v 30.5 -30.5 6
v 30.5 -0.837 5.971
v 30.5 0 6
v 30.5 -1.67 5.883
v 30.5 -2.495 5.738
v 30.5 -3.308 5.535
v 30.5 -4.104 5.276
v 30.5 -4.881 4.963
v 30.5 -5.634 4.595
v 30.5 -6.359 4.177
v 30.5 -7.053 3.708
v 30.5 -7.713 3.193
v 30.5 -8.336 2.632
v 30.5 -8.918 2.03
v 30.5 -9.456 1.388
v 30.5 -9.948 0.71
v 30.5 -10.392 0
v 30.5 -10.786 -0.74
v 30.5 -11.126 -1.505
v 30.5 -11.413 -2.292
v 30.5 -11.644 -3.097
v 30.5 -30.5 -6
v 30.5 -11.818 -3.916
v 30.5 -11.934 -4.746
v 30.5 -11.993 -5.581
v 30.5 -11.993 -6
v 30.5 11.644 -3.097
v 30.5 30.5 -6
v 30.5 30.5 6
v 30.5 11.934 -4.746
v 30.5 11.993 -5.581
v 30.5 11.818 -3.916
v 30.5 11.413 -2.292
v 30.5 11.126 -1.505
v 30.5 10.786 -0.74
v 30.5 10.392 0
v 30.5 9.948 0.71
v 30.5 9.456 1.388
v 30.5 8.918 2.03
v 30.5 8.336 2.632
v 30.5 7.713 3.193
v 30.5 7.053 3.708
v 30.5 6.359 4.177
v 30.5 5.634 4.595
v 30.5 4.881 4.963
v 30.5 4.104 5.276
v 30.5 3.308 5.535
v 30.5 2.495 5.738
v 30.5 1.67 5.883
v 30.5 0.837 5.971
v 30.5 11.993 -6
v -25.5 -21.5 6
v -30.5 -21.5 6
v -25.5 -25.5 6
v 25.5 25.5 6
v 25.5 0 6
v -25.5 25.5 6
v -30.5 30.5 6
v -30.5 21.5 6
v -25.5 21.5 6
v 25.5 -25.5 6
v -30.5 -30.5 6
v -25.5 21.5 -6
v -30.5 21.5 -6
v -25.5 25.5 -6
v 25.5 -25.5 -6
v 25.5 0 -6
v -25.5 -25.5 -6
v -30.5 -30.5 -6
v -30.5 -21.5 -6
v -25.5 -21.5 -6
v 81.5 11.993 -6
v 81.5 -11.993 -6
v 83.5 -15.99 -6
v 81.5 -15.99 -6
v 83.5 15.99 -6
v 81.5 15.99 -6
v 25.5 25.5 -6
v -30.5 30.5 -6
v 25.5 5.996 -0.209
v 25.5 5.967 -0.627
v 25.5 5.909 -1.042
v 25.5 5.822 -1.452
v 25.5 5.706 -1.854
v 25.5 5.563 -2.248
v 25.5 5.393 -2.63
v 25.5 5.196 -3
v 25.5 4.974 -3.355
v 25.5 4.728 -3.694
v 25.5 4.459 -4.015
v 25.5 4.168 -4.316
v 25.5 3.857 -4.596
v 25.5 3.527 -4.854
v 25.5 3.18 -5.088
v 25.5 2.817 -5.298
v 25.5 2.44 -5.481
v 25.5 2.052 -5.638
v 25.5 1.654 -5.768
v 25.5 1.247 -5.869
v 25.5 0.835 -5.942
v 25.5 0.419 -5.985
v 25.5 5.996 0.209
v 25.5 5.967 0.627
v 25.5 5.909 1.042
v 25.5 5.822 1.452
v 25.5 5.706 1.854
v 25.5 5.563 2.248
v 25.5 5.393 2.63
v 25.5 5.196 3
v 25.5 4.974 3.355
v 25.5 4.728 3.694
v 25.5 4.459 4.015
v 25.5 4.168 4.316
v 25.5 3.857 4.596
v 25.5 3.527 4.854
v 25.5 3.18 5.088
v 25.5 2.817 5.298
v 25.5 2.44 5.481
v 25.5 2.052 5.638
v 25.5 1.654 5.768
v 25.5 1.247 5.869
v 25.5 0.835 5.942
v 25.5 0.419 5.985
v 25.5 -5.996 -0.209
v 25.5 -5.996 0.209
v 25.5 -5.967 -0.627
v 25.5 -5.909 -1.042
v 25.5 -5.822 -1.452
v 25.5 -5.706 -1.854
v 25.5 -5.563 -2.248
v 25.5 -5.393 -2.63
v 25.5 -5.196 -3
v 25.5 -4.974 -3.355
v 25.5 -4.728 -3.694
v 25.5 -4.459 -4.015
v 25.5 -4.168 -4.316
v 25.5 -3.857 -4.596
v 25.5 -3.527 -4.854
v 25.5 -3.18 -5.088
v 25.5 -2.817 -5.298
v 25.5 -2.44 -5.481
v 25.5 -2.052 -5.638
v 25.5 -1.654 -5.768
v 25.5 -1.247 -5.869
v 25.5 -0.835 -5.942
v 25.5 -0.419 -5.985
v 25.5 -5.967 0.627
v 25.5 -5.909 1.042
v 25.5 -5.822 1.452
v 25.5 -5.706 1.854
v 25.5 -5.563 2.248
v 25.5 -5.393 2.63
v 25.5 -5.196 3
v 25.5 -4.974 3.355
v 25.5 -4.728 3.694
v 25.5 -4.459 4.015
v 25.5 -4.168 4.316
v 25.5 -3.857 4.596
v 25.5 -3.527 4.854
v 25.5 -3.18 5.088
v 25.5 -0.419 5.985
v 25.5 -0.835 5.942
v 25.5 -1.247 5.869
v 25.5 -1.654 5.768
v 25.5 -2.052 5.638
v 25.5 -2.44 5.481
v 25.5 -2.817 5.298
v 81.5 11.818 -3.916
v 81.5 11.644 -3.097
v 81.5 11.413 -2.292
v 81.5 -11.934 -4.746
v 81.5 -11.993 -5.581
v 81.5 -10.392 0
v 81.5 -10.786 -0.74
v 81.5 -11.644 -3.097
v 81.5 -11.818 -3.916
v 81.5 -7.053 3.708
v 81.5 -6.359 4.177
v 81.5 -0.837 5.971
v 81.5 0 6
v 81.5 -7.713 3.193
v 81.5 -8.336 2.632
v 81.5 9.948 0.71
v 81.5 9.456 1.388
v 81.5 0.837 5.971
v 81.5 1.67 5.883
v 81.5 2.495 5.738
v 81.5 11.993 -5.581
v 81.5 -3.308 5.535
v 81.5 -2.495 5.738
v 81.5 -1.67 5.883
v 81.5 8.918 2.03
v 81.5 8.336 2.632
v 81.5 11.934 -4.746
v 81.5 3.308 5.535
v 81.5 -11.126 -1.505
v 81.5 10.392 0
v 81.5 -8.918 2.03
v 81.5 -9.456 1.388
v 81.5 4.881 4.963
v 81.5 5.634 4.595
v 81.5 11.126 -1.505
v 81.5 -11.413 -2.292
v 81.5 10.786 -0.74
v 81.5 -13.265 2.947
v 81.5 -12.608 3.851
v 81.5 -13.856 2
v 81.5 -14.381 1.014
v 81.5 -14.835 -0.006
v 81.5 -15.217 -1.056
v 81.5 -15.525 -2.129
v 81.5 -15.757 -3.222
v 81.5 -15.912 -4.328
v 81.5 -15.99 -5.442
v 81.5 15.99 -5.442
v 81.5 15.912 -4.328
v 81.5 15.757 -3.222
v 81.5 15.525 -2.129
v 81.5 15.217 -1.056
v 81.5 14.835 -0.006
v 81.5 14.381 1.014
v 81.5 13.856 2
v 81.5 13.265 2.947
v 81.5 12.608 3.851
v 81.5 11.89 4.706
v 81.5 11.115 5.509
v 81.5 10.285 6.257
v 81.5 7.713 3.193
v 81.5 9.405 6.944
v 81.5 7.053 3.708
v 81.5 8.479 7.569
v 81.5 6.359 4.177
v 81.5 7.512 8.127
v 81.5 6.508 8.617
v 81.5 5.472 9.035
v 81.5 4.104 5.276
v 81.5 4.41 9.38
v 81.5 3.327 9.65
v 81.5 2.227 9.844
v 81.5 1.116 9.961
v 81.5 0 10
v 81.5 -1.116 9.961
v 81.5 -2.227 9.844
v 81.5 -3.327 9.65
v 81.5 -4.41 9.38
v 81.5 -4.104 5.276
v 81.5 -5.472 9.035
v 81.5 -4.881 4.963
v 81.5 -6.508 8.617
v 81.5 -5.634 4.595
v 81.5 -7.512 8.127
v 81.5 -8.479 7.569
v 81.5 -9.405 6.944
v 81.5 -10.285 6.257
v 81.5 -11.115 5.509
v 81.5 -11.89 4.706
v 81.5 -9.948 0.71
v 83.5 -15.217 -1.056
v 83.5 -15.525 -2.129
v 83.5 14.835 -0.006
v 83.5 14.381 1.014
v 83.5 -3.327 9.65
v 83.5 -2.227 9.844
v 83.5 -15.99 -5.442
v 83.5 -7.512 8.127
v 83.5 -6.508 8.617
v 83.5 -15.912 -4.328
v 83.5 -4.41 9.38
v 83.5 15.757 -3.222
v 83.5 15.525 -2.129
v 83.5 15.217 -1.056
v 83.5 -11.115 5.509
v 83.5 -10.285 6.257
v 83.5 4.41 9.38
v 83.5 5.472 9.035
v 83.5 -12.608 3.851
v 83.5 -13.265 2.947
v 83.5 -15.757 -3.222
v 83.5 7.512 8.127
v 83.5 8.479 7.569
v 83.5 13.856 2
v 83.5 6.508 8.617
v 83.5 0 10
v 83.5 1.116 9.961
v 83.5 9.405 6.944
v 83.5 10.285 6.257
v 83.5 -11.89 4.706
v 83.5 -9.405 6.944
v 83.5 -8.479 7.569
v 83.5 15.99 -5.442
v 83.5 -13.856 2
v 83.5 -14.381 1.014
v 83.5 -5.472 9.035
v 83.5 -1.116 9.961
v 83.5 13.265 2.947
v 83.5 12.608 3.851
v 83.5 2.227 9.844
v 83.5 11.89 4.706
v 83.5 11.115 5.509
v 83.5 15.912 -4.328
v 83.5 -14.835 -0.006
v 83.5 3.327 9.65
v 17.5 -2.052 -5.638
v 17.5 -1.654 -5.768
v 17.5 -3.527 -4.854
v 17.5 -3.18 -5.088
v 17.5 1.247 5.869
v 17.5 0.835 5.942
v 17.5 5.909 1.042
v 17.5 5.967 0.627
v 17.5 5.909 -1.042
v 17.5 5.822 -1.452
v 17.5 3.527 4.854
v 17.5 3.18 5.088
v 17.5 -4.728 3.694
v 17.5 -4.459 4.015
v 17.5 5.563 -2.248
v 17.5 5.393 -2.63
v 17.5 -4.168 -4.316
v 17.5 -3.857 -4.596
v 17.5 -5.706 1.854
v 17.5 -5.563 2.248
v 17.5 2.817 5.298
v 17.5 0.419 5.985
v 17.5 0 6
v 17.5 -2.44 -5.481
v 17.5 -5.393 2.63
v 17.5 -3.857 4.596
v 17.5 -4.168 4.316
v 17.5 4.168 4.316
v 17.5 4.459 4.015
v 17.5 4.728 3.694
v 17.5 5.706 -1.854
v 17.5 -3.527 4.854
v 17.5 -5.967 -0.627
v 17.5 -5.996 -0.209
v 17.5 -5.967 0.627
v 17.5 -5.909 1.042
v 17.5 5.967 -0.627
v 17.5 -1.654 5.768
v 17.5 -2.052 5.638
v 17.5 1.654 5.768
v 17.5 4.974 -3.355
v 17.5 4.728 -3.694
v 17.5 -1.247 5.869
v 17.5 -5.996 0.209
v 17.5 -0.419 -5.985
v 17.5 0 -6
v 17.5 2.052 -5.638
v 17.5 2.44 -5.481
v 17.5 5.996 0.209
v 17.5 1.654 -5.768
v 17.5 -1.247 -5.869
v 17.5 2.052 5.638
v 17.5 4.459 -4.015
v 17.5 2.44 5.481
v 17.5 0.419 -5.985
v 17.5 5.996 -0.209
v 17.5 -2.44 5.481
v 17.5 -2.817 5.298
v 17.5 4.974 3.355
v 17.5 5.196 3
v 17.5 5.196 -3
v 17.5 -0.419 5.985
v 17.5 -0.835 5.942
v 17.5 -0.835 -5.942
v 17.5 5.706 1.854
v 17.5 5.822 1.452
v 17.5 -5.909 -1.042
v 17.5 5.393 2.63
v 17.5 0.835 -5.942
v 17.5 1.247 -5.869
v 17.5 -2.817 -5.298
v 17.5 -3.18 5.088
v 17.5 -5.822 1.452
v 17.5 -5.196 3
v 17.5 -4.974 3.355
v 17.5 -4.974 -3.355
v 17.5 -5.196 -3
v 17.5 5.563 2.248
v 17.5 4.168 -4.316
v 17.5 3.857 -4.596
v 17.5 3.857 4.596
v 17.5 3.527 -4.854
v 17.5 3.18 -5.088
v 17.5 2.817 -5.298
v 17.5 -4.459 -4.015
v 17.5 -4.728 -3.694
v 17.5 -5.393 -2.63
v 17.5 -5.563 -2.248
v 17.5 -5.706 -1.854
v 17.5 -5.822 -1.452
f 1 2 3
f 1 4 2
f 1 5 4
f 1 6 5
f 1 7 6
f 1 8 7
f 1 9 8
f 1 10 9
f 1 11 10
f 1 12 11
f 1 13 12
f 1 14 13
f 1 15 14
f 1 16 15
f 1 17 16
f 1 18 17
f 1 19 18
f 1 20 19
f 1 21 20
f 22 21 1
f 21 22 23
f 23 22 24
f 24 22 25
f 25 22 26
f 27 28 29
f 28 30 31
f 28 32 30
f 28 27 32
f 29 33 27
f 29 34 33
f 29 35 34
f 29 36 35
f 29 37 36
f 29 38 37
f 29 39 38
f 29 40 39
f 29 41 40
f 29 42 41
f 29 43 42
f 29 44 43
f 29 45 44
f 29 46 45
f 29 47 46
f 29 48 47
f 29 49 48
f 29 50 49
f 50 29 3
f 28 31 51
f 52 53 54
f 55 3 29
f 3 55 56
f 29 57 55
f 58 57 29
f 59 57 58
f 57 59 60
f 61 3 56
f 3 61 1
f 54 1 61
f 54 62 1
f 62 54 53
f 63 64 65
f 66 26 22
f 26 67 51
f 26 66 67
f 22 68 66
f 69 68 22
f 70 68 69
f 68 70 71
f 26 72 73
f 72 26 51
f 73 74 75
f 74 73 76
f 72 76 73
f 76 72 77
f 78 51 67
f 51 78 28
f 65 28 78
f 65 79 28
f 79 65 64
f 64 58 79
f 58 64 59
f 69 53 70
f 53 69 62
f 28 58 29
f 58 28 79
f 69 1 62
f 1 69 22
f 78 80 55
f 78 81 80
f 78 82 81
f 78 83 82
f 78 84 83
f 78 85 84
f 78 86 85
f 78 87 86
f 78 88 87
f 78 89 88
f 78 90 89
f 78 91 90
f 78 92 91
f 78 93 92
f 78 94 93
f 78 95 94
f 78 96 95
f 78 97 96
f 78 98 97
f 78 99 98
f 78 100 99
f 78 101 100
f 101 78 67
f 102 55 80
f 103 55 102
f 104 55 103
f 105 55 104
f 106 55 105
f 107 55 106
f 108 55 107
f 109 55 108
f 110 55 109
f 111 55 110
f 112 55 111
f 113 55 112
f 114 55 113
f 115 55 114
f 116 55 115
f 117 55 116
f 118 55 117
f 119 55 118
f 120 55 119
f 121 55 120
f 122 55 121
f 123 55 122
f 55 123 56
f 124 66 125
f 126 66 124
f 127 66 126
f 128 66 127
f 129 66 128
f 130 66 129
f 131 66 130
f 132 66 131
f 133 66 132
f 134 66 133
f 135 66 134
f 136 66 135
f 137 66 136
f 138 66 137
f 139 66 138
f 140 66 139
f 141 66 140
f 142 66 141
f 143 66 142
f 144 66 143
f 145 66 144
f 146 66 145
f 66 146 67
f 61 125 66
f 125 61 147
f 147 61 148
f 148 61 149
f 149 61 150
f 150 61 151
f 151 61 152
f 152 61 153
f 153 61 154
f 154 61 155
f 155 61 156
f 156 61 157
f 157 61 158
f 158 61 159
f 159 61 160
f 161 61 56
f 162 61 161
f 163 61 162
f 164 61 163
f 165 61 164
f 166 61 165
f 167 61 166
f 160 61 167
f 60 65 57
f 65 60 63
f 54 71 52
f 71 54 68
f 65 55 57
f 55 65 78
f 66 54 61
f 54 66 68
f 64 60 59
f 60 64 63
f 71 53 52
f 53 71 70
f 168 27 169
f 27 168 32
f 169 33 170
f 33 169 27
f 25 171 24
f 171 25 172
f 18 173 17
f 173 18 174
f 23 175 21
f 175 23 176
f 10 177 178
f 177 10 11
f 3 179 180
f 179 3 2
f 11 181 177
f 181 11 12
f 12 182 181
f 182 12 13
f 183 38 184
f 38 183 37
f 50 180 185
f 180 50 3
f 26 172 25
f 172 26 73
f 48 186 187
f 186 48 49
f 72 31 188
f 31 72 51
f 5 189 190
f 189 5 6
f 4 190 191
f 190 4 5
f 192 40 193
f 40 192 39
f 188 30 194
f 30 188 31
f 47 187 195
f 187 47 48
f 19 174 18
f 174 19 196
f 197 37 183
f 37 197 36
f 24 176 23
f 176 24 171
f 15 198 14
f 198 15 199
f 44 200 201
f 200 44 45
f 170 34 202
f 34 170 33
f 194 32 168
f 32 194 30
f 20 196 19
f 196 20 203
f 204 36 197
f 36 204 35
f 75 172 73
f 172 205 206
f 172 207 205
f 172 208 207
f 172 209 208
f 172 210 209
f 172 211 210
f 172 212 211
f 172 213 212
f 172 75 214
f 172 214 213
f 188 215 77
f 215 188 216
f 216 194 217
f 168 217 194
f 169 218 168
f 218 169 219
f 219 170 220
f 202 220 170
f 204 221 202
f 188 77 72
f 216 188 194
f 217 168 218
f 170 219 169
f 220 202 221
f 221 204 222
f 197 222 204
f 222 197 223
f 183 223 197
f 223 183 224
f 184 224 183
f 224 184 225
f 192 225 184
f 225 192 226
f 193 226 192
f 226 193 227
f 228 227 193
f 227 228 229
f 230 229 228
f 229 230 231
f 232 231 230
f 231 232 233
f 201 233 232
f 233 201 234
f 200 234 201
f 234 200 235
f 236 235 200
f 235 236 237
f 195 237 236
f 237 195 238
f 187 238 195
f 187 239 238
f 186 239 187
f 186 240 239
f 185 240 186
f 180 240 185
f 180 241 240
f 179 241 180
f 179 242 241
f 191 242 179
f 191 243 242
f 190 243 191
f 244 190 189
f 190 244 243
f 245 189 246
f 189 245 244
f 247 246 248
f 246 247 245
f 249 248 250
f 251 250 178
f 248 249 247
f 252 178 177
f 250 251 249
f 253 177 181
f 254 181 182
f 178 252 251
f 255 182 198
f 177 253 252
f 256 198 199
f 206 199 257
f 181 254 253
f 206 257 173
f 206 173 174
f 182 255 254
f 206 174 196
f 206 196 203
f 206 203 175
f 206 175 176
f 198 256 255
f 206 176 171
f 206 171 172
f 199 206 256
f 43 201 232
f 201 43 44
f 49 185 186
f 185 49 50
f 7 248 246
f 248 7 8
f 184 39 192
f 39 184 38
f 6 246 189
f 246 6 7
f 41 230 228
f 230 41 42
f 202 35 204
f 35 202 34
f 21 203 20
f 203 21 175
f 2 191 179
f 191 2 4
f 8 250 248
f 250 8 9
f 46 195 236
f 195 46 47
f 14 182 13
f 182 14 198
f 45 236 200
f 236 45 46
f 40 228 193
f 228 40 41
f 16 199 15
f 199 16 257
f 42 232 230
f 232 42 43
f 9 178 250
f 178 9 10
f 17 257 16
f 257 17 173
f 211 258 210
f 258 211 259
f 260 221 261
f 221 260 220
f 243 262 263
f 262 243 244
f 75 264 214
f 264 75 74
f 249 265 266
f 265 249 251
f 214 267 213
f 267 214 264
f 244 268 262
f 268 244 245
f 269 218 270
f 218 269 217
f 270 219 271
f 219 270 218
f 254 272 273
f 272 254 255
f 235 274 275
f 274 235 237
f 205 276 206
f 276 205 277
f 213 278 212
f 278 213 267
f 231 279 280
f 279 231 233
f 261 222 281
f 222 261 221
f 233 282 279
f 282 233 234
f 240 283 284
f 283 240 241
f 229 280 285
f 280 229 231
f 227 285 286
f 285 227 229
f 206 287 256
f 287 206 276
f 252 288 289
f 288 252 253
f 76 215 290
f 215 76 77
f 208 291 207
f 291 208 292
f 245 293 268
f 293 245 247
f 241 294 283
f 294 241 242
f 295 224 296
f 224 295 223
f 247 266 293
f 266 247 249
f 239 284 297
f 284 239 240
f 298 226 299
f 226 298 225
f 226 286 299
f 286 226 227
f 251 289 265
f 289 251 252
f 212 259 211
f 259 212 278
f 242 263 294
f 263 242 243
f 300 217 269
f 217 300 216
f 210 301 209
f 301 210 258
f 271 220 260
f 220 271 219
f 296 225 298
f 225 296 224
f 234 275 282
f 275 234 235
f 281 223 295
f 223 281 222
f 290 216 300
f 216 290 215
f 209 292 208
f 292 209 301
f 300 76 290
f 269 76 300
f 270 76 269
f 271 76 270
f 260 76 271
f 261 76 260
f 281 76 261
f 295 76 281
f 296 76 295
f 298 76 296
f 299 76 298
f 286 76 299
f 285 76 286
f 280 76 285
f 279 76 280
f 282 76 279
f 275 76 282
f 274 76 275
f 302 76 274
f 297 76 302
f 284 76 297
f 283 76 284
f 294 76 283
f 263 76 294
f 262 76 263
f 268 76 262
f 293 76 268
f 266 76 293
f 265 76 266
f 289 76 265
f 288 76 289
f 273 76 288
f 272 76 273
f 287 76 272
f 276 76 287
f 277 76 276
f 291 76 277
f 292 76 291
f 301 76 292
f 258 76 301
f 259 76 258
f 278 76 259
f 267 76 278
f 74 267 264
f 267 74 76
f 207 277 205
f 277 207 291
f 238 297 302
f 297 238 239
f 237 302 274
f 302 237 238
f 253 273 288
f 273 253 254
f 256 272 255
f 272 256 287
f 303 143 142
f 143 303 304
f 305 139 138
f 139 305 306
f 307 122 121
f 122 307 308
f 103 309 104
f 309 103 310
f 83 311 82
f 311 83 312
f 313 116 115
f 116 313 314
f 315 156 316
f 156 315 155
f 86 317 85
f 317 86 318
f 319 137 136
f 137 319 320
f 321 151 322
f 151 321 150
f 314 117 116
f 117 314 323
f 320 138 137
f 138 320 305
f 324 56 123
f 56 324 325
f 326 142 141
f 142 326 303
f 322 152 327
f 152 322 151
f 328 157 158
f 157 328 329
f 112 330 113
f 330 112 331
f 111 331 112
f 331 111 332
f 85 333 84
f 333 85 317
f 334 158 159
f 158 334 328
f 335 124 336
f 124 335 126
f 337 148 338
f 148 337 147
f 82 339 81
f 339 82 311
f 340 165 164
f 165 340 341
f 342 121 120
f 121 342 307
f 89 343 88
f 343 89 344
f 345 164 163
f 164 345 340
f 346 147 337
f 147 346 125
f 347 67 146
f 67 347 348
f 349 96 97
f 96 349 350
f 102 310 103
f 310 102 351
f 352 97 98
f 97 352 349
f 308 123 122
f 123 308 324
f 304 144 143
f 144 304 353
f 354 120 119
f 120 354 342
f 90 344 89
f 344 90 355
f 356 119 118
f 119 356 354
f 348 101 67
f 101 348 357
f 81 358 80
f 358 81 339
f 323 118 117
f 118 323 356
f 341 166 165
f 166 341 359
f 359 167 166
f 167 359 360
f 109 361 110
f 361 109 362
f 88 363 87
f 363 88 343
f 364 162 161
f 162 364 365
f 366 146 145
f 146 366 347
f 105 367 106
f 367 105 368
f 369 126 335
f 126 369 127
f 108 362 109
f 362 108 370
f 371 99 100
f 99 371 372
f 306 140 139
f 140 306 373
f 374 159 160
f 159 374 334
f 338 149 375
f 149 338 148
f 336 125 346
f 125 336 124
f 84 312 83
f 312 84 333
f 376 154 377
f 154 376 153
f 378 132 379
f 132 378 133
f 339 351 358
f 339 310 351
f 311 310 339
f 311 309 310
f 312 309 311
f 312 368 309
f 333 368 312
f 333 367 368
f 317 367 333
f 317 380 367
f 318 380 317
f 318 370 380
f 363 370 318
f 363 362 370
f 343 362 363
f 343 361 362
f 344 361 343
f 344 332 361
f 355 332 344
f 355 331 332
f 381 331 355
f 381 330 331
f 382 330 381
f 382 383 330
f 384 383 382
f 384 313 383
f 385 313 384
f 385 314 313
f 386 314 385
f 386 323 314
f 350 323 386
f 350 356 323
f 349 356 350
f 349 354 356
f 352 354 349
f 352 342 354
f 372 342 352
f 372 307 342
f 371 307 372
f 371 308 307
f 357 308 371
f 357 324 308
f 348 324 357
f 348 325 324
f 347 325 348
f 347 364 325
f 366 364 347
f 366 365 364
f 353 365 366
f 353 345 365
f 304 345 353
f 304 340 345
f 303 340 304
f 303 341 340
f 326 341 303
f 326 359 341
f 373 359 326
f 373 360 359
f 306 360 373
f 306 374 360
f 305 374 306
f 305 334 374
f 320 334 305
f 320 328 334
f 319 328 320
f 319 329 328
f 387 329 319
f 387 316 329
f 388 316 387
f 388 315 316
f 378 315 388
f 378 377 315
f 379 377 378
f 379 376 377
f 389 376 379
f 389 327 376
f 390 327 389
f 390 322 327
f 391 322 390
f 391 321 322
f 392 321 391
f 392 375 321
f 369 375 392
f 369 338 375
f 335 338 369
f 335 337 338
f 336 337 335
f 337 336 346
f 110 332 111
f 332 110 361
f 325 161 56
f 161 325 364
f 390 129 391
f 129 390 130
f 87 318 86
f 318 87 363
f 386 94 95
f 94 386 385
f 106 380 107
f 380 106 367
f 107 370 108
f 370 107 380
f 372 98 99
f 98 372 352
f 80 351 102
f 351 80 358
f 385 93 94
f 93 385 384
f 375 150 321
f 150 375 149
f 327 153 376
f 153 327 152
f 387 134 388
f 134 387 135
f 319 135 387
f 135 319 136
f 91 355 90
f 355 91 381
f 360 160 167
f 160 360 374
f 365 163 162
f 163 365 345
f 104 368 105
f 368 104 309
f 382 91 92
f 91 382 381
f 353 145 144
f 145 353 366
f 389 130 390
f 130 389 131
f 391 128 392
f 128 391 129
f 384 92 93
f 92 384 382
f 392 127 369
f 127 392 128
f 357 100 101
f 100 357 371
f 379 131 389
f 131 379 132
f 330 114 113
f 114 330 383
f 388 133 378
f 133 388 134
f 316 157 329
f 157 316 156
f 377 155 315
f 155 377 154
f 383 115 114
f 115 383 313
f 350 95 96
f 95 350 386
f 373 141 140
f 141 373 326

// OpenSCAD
$fn = 90;

d = 51;   // frame size
h = 12;   // hole diameter
c = 51;   // clip length
C = 24;   // clip diameter
w = 5;    // body width
H = h;    // body height

union() {
  difference() {
    cube([d + 2 * w, d + 2 * w, H], center = true);
    cube([d, d, H + 1], center = true);
    translate([-d/2, 0, 0])
      cube([d, d - 8, H + 1], center = true);
  }
  translate([d / 2, 0, 0])
    rotate([0, -90, 0])
      cylinder(8, d = h);
  intersection() {
    translate([d / 2 + w, 0, 0])
        translate([0, 0, -C/2 + h/2])
          rotate([0, 90, 0])
            union() {
              cylinder(c, d = C);
              translate([0, 0, c])
                cylinder(2, d = C + 8);
            }
    translate([-150, -d / 2, -H / 2])
      cube([300, d, 2 * H]);
  }
}
